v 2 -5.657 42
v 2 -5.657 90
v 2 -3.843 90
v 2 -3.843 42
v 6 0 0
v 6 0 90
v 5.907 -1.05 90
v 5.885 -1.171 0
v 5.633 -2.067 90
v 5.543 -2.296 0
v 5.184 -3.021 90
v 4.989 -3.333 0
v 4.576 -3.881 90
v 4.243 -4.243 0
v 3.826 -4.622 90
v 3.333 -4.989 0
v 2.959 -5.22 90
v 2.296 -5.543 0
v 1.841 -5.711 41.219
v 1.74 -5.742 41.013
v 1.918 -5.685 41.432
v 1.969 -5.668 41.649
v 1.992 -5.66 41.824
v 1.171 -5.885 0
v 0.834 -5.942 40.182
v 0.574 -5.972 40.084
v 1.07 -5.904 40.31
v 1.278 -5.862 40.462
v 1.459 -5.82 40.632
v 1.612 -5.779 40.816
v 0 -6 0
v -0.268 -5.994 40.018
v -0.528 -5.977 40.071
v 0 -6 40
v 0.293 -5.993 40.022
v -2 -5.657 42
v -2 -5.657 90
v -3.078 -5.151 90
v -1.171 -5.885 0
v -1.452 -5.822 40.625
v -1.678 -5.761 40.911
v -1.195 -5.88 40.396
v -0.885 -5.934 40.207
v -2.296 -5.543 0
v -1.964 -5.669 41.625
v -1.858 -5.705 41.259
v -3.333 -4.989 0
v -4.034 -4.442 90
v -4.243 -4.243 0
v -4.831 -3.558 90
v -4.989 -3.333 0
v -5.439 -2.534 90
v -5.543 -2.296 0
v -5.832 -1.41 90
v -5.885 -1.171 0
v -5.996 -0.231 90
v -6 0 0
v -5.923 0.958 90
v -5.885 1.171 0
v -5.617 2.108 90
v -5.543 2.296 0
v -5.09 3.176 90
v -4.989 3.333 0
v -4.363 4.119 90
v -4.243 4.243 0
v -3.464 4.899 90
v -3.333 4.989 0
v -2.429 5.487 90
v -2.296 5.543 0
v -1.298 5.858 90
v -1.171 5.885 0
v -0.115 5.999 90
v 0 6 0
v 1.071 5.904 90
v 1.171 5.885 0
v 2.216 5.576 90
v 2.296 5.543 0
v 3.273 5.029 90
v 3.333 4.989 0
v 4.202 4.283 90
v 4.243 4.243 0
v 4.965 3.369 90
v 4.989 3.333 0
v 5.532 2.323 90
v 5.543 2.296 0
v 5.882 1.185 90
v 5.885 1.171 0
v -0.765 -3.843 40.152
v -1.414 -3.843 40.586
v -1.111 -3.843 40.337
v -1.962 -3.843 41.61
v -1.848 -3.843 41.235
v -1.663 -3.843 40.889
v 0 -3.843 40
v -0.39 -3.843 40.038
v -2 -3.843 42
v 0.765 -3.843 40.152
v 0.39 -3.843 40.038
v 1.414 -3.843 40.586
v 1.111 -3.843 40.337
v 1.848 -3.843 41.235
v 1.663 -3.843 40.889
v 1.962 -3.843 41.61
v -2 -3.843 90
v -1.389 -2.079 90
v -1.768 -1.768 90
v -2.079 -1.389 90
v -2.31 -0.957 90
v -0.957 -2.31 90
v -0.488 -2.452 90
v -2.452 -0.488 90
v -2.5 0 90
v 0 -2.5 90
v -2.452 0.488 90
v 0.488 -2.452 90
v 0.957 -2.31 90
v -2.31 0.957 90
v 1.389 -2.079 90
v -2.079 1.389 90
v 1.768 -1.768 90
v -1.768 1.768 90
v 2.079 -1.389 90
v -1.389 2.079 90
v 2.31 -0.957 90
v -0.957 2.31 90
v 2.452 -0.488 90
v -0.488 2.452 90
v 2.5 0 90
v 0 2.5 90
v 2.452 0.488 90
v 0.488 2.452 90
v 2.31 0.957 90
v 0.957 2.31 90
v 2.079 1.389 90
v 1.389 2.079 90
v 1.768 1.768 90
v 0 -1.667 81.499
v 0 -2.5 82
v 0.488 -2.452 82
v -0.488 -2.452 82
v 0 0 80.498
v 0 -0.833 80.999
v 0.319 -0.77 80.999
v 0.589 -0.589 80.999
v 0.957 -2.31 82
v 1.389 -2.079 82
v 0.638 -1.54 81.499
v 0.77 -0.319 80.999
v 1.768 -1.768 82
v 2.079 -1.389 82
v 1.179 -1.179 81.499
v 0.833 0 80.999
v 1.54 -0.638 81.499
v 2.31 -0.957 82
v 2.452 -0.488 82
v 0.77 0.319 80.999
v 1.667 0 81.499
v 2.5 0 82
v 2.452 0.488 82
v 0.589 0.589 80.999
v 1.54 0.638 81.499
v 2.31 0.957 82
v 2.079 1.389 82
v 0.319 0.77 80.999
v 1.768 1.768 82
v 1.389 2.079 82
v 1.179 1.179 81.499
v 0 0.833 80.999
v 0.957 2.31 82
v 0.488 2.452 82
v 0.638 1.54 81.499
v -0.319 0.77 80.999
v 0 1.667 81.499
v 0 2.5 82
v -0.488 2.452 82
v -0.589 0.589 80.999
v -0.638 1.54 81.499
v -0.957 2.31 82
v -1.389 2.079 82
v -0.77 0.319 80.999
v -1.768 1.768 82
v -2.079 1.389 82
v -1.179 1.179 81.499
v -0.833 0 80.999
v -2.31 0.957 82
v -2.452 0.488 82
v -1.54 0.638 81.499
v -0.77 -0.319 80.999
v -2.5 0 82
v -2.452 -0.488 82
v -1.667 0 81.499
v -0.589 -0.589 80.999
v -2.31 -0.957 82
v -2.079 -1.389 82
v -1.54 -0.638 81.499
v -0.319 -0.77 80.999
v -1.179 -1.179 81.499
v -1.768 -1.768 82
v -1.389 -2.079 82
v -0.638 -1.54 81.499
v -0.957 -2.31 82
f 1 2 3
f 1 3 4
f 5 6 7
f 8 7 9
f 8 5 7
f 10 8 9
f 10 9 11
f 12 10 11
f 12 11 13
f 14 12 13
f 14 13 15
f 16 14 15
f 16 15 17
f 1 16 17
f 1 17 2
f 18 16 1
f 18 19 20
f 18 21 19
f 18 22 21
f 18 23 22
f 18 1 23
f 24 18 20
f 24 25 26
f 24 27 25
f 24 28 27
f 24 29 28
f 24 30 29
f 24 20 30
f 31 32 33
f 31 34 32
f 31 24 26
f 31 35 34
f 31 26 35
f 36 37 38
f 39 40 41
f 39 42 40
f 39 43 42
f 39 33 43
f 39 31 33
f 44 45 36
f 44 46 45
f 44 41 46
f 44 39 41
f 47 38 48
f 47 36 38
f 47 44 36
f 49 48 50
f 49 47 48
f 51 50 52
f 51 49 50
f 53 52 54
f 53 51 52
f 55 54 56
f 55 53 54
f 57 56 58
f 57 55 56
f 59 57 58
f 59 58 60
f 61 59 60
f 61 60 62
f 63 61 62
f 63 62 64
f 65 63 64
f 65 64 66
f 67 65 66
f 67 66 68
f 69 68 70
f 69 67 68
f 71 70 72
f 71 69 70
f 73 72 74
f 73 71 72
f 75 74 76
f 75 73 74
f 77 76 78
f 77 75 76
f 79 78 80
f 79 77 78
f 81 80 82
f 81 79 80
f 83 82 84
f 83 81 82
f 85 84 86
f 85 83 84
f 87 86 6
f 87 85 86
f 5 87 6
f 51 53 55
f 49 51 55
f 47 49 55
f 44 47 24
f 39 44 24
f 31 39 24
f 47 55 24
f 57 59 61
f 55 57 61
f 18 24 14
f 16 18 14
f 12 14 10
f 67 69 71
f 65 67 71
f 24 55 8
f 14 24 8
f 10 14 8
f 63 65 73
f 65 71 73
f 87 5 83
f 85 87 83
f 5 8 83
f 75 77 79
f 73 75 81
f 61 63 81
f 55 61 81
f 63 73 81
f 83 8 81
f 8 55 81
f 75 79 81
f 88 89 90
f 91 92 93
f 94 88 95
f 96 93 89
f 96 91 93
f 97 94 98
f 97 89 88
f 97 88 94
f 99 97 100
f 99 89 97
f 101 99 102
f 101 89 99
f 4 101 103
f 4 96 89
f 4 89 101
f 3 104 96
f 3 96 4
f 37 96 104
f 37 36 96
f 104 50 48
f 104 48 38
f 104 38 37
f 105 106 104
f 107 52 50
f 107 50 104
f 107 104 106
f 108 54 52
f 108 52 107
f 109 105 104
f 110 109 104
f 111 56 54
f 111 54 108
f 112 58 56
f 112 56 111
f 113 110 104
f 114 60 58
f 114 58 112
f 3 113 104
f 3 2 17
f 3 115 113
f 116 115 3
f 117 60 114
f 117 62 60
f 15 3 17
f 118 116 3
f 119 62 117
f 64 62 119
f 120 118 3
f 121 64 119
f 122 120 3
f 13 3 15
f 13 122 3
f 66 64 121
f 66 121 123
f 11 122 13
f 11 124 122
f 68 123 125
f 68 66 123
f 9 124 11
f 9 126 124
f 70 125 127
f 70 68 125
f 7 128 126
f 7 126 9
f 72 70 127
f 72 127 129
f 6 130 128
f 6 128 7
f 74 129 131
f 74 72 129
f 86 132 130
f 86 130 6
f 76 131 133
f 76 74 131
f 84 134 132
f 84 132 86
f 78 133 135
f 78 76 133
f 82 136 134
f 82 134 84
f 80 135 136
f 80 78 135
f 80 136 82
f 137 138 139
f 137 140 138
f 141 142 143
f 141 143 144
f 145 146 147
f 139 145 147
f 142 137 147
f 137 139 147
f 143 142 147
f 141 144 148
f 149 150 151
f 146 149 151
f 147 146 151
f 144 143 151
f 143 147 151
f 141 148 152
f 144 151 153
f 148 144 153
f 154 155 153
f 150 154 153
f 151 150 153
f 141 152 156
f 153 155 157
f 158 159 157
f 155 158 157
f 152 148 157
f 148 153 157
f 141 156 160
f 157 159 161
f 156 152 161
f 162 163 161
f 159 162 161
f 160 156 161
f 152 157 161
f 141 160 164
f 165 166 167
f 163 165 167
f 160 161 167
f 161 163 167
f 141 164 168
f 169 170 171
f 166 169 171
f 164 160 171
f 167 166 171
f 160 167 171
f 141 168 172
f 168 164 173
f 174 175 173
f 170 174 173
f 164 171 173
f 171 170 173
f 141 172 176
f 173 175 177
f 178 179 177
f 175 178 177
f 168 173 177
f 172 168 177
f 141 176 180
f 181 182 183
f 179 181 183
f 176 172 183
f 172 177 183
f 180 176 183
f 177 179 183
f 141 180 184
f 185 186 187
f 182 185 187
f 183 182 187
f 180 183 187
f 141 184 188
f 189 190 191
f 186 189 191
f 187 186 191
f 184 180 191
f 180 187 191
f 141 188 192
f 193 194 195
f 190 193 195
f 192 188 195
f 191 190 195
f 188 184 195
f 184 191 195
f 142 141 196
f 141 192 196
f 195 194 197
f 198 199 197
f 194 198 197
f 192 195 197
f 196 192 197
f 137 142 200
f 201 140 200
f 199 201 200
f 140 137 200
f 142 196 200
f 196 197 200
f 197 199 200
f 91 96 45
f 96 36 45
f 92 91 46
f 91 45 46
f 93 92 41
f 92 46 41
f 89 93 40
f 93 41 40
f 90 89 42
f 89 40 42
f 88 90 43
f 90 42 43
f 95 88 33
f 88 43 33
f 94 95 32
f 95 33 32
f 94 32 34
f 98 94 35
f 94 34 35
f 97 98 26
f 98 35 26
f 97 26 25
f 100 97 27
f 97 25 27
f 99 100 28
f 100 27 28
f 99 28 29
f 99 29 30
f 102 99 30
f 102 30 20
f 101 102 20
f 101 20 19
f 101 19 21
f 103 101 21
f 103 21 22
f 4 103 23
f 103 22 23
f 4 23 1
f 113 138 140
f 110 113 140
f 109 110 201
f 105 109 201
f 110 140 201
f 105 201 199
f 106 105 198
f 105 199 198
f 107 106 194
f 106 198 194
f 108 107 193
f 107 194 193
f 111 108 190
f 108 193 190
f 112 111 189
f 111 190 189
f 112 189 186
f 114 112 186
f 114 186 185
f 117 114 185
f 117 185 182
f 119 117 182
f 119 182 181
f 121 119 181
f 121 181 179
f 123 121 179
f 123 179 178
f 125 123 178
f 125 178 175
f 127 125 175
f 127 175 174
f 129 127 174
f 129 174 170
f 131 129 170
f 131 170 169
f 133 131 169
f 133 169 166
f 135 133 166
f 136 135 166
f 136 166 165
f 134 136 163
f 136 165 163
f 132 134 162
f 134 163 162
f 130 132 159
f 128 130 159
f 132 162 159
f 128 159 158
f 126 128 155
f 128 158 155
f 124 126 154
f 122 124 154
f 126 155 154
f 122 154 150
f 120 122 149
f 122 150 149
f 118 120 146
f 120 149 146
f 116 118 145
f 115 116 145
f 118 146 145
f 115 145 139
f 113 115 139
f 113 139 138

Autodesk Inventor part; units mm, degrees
ref_plane "YZ Plane" through (0, 0, 0) normal (1, 0, 0) x (0, 1, 0)
ref_plane "XZ Plane" through (0, 0, 0) normal (0, 1, 0) x (-1, 0, 0)
sketch "スケッチ1" plane through (0, 0, 0) normal (0, 0, 1) x (1, 0, 0)
  circle A0 centre (0, 0) radius 6
  dimension "d0" = 12
extrude "押し出し1" add sketch "スケッチ1" along normal blind 35
thread "ねじ1" size "M10x1.5" class "6g" standard "ANSI Metric M Profile" length 10
sketch "スケッチ2" plane through (0, 0, 35) normal (0, 0, 1) x (1, 0, 0)
  circle A0 centre (0, 0) radius 6
  dimension "d5" = 12
extrude "押し出し2" add sketch "スケッチ2" along normal blind 55
sketch "スケッチ6" plane through (0, 0, 90) normal (0, 0, 1) x (1, 0, 0)
  line L0 (0, 0) -> (0, -6) construction
  circle A0 centre (0, 0) radius 6 projected
ref_plane "作業平面5" through (0, -6, 90) normal (0, -1, 0) x (1, 0, 0)
sketch "スケッチ8" plane through (0, -6, 90) normal (0, -1, 0) x (1, 0, 0)
  line L0 (6, 0) -> (-6, 0) projected
  line L1 (-2, 0) -> (2, 0)
  line L2 (-2, 0) -> (2, 0)
  line L3 (2, 0) -> (2, -48)
  line L4 (-2, -48) -> (-2, 0)
  arc A0 (-2, -48) -> (2, -48) centre (0, -48) ccw
  point P0 (0, -90)
  point P1 (0, 0)
  dimension "d11" = 2
  dimension "d17" = 48
  dimension "d29" = 2
extrude "押し出し3" cut sketch "スケッチ8" against normal blind 2.157
sketch "スケッチ9" plane through (0, 0, 90) normal (0, 0, 1) x (1, 0, 0)
  point P0 (0, 0)
  point P1 (0, 0)
hole "穴1" at (0, 0, 90) direction (0, 0, -1) diameter 5 depth 8 tip angle 118
thread "ねじ2" size "Rc 2 1/2" standard "ISO Taper Internal" full length
thread "ねじ3" size "M5x0.8" class "6H" standard "ANSI Metric M Profile" full length
properties part number "正しい"
